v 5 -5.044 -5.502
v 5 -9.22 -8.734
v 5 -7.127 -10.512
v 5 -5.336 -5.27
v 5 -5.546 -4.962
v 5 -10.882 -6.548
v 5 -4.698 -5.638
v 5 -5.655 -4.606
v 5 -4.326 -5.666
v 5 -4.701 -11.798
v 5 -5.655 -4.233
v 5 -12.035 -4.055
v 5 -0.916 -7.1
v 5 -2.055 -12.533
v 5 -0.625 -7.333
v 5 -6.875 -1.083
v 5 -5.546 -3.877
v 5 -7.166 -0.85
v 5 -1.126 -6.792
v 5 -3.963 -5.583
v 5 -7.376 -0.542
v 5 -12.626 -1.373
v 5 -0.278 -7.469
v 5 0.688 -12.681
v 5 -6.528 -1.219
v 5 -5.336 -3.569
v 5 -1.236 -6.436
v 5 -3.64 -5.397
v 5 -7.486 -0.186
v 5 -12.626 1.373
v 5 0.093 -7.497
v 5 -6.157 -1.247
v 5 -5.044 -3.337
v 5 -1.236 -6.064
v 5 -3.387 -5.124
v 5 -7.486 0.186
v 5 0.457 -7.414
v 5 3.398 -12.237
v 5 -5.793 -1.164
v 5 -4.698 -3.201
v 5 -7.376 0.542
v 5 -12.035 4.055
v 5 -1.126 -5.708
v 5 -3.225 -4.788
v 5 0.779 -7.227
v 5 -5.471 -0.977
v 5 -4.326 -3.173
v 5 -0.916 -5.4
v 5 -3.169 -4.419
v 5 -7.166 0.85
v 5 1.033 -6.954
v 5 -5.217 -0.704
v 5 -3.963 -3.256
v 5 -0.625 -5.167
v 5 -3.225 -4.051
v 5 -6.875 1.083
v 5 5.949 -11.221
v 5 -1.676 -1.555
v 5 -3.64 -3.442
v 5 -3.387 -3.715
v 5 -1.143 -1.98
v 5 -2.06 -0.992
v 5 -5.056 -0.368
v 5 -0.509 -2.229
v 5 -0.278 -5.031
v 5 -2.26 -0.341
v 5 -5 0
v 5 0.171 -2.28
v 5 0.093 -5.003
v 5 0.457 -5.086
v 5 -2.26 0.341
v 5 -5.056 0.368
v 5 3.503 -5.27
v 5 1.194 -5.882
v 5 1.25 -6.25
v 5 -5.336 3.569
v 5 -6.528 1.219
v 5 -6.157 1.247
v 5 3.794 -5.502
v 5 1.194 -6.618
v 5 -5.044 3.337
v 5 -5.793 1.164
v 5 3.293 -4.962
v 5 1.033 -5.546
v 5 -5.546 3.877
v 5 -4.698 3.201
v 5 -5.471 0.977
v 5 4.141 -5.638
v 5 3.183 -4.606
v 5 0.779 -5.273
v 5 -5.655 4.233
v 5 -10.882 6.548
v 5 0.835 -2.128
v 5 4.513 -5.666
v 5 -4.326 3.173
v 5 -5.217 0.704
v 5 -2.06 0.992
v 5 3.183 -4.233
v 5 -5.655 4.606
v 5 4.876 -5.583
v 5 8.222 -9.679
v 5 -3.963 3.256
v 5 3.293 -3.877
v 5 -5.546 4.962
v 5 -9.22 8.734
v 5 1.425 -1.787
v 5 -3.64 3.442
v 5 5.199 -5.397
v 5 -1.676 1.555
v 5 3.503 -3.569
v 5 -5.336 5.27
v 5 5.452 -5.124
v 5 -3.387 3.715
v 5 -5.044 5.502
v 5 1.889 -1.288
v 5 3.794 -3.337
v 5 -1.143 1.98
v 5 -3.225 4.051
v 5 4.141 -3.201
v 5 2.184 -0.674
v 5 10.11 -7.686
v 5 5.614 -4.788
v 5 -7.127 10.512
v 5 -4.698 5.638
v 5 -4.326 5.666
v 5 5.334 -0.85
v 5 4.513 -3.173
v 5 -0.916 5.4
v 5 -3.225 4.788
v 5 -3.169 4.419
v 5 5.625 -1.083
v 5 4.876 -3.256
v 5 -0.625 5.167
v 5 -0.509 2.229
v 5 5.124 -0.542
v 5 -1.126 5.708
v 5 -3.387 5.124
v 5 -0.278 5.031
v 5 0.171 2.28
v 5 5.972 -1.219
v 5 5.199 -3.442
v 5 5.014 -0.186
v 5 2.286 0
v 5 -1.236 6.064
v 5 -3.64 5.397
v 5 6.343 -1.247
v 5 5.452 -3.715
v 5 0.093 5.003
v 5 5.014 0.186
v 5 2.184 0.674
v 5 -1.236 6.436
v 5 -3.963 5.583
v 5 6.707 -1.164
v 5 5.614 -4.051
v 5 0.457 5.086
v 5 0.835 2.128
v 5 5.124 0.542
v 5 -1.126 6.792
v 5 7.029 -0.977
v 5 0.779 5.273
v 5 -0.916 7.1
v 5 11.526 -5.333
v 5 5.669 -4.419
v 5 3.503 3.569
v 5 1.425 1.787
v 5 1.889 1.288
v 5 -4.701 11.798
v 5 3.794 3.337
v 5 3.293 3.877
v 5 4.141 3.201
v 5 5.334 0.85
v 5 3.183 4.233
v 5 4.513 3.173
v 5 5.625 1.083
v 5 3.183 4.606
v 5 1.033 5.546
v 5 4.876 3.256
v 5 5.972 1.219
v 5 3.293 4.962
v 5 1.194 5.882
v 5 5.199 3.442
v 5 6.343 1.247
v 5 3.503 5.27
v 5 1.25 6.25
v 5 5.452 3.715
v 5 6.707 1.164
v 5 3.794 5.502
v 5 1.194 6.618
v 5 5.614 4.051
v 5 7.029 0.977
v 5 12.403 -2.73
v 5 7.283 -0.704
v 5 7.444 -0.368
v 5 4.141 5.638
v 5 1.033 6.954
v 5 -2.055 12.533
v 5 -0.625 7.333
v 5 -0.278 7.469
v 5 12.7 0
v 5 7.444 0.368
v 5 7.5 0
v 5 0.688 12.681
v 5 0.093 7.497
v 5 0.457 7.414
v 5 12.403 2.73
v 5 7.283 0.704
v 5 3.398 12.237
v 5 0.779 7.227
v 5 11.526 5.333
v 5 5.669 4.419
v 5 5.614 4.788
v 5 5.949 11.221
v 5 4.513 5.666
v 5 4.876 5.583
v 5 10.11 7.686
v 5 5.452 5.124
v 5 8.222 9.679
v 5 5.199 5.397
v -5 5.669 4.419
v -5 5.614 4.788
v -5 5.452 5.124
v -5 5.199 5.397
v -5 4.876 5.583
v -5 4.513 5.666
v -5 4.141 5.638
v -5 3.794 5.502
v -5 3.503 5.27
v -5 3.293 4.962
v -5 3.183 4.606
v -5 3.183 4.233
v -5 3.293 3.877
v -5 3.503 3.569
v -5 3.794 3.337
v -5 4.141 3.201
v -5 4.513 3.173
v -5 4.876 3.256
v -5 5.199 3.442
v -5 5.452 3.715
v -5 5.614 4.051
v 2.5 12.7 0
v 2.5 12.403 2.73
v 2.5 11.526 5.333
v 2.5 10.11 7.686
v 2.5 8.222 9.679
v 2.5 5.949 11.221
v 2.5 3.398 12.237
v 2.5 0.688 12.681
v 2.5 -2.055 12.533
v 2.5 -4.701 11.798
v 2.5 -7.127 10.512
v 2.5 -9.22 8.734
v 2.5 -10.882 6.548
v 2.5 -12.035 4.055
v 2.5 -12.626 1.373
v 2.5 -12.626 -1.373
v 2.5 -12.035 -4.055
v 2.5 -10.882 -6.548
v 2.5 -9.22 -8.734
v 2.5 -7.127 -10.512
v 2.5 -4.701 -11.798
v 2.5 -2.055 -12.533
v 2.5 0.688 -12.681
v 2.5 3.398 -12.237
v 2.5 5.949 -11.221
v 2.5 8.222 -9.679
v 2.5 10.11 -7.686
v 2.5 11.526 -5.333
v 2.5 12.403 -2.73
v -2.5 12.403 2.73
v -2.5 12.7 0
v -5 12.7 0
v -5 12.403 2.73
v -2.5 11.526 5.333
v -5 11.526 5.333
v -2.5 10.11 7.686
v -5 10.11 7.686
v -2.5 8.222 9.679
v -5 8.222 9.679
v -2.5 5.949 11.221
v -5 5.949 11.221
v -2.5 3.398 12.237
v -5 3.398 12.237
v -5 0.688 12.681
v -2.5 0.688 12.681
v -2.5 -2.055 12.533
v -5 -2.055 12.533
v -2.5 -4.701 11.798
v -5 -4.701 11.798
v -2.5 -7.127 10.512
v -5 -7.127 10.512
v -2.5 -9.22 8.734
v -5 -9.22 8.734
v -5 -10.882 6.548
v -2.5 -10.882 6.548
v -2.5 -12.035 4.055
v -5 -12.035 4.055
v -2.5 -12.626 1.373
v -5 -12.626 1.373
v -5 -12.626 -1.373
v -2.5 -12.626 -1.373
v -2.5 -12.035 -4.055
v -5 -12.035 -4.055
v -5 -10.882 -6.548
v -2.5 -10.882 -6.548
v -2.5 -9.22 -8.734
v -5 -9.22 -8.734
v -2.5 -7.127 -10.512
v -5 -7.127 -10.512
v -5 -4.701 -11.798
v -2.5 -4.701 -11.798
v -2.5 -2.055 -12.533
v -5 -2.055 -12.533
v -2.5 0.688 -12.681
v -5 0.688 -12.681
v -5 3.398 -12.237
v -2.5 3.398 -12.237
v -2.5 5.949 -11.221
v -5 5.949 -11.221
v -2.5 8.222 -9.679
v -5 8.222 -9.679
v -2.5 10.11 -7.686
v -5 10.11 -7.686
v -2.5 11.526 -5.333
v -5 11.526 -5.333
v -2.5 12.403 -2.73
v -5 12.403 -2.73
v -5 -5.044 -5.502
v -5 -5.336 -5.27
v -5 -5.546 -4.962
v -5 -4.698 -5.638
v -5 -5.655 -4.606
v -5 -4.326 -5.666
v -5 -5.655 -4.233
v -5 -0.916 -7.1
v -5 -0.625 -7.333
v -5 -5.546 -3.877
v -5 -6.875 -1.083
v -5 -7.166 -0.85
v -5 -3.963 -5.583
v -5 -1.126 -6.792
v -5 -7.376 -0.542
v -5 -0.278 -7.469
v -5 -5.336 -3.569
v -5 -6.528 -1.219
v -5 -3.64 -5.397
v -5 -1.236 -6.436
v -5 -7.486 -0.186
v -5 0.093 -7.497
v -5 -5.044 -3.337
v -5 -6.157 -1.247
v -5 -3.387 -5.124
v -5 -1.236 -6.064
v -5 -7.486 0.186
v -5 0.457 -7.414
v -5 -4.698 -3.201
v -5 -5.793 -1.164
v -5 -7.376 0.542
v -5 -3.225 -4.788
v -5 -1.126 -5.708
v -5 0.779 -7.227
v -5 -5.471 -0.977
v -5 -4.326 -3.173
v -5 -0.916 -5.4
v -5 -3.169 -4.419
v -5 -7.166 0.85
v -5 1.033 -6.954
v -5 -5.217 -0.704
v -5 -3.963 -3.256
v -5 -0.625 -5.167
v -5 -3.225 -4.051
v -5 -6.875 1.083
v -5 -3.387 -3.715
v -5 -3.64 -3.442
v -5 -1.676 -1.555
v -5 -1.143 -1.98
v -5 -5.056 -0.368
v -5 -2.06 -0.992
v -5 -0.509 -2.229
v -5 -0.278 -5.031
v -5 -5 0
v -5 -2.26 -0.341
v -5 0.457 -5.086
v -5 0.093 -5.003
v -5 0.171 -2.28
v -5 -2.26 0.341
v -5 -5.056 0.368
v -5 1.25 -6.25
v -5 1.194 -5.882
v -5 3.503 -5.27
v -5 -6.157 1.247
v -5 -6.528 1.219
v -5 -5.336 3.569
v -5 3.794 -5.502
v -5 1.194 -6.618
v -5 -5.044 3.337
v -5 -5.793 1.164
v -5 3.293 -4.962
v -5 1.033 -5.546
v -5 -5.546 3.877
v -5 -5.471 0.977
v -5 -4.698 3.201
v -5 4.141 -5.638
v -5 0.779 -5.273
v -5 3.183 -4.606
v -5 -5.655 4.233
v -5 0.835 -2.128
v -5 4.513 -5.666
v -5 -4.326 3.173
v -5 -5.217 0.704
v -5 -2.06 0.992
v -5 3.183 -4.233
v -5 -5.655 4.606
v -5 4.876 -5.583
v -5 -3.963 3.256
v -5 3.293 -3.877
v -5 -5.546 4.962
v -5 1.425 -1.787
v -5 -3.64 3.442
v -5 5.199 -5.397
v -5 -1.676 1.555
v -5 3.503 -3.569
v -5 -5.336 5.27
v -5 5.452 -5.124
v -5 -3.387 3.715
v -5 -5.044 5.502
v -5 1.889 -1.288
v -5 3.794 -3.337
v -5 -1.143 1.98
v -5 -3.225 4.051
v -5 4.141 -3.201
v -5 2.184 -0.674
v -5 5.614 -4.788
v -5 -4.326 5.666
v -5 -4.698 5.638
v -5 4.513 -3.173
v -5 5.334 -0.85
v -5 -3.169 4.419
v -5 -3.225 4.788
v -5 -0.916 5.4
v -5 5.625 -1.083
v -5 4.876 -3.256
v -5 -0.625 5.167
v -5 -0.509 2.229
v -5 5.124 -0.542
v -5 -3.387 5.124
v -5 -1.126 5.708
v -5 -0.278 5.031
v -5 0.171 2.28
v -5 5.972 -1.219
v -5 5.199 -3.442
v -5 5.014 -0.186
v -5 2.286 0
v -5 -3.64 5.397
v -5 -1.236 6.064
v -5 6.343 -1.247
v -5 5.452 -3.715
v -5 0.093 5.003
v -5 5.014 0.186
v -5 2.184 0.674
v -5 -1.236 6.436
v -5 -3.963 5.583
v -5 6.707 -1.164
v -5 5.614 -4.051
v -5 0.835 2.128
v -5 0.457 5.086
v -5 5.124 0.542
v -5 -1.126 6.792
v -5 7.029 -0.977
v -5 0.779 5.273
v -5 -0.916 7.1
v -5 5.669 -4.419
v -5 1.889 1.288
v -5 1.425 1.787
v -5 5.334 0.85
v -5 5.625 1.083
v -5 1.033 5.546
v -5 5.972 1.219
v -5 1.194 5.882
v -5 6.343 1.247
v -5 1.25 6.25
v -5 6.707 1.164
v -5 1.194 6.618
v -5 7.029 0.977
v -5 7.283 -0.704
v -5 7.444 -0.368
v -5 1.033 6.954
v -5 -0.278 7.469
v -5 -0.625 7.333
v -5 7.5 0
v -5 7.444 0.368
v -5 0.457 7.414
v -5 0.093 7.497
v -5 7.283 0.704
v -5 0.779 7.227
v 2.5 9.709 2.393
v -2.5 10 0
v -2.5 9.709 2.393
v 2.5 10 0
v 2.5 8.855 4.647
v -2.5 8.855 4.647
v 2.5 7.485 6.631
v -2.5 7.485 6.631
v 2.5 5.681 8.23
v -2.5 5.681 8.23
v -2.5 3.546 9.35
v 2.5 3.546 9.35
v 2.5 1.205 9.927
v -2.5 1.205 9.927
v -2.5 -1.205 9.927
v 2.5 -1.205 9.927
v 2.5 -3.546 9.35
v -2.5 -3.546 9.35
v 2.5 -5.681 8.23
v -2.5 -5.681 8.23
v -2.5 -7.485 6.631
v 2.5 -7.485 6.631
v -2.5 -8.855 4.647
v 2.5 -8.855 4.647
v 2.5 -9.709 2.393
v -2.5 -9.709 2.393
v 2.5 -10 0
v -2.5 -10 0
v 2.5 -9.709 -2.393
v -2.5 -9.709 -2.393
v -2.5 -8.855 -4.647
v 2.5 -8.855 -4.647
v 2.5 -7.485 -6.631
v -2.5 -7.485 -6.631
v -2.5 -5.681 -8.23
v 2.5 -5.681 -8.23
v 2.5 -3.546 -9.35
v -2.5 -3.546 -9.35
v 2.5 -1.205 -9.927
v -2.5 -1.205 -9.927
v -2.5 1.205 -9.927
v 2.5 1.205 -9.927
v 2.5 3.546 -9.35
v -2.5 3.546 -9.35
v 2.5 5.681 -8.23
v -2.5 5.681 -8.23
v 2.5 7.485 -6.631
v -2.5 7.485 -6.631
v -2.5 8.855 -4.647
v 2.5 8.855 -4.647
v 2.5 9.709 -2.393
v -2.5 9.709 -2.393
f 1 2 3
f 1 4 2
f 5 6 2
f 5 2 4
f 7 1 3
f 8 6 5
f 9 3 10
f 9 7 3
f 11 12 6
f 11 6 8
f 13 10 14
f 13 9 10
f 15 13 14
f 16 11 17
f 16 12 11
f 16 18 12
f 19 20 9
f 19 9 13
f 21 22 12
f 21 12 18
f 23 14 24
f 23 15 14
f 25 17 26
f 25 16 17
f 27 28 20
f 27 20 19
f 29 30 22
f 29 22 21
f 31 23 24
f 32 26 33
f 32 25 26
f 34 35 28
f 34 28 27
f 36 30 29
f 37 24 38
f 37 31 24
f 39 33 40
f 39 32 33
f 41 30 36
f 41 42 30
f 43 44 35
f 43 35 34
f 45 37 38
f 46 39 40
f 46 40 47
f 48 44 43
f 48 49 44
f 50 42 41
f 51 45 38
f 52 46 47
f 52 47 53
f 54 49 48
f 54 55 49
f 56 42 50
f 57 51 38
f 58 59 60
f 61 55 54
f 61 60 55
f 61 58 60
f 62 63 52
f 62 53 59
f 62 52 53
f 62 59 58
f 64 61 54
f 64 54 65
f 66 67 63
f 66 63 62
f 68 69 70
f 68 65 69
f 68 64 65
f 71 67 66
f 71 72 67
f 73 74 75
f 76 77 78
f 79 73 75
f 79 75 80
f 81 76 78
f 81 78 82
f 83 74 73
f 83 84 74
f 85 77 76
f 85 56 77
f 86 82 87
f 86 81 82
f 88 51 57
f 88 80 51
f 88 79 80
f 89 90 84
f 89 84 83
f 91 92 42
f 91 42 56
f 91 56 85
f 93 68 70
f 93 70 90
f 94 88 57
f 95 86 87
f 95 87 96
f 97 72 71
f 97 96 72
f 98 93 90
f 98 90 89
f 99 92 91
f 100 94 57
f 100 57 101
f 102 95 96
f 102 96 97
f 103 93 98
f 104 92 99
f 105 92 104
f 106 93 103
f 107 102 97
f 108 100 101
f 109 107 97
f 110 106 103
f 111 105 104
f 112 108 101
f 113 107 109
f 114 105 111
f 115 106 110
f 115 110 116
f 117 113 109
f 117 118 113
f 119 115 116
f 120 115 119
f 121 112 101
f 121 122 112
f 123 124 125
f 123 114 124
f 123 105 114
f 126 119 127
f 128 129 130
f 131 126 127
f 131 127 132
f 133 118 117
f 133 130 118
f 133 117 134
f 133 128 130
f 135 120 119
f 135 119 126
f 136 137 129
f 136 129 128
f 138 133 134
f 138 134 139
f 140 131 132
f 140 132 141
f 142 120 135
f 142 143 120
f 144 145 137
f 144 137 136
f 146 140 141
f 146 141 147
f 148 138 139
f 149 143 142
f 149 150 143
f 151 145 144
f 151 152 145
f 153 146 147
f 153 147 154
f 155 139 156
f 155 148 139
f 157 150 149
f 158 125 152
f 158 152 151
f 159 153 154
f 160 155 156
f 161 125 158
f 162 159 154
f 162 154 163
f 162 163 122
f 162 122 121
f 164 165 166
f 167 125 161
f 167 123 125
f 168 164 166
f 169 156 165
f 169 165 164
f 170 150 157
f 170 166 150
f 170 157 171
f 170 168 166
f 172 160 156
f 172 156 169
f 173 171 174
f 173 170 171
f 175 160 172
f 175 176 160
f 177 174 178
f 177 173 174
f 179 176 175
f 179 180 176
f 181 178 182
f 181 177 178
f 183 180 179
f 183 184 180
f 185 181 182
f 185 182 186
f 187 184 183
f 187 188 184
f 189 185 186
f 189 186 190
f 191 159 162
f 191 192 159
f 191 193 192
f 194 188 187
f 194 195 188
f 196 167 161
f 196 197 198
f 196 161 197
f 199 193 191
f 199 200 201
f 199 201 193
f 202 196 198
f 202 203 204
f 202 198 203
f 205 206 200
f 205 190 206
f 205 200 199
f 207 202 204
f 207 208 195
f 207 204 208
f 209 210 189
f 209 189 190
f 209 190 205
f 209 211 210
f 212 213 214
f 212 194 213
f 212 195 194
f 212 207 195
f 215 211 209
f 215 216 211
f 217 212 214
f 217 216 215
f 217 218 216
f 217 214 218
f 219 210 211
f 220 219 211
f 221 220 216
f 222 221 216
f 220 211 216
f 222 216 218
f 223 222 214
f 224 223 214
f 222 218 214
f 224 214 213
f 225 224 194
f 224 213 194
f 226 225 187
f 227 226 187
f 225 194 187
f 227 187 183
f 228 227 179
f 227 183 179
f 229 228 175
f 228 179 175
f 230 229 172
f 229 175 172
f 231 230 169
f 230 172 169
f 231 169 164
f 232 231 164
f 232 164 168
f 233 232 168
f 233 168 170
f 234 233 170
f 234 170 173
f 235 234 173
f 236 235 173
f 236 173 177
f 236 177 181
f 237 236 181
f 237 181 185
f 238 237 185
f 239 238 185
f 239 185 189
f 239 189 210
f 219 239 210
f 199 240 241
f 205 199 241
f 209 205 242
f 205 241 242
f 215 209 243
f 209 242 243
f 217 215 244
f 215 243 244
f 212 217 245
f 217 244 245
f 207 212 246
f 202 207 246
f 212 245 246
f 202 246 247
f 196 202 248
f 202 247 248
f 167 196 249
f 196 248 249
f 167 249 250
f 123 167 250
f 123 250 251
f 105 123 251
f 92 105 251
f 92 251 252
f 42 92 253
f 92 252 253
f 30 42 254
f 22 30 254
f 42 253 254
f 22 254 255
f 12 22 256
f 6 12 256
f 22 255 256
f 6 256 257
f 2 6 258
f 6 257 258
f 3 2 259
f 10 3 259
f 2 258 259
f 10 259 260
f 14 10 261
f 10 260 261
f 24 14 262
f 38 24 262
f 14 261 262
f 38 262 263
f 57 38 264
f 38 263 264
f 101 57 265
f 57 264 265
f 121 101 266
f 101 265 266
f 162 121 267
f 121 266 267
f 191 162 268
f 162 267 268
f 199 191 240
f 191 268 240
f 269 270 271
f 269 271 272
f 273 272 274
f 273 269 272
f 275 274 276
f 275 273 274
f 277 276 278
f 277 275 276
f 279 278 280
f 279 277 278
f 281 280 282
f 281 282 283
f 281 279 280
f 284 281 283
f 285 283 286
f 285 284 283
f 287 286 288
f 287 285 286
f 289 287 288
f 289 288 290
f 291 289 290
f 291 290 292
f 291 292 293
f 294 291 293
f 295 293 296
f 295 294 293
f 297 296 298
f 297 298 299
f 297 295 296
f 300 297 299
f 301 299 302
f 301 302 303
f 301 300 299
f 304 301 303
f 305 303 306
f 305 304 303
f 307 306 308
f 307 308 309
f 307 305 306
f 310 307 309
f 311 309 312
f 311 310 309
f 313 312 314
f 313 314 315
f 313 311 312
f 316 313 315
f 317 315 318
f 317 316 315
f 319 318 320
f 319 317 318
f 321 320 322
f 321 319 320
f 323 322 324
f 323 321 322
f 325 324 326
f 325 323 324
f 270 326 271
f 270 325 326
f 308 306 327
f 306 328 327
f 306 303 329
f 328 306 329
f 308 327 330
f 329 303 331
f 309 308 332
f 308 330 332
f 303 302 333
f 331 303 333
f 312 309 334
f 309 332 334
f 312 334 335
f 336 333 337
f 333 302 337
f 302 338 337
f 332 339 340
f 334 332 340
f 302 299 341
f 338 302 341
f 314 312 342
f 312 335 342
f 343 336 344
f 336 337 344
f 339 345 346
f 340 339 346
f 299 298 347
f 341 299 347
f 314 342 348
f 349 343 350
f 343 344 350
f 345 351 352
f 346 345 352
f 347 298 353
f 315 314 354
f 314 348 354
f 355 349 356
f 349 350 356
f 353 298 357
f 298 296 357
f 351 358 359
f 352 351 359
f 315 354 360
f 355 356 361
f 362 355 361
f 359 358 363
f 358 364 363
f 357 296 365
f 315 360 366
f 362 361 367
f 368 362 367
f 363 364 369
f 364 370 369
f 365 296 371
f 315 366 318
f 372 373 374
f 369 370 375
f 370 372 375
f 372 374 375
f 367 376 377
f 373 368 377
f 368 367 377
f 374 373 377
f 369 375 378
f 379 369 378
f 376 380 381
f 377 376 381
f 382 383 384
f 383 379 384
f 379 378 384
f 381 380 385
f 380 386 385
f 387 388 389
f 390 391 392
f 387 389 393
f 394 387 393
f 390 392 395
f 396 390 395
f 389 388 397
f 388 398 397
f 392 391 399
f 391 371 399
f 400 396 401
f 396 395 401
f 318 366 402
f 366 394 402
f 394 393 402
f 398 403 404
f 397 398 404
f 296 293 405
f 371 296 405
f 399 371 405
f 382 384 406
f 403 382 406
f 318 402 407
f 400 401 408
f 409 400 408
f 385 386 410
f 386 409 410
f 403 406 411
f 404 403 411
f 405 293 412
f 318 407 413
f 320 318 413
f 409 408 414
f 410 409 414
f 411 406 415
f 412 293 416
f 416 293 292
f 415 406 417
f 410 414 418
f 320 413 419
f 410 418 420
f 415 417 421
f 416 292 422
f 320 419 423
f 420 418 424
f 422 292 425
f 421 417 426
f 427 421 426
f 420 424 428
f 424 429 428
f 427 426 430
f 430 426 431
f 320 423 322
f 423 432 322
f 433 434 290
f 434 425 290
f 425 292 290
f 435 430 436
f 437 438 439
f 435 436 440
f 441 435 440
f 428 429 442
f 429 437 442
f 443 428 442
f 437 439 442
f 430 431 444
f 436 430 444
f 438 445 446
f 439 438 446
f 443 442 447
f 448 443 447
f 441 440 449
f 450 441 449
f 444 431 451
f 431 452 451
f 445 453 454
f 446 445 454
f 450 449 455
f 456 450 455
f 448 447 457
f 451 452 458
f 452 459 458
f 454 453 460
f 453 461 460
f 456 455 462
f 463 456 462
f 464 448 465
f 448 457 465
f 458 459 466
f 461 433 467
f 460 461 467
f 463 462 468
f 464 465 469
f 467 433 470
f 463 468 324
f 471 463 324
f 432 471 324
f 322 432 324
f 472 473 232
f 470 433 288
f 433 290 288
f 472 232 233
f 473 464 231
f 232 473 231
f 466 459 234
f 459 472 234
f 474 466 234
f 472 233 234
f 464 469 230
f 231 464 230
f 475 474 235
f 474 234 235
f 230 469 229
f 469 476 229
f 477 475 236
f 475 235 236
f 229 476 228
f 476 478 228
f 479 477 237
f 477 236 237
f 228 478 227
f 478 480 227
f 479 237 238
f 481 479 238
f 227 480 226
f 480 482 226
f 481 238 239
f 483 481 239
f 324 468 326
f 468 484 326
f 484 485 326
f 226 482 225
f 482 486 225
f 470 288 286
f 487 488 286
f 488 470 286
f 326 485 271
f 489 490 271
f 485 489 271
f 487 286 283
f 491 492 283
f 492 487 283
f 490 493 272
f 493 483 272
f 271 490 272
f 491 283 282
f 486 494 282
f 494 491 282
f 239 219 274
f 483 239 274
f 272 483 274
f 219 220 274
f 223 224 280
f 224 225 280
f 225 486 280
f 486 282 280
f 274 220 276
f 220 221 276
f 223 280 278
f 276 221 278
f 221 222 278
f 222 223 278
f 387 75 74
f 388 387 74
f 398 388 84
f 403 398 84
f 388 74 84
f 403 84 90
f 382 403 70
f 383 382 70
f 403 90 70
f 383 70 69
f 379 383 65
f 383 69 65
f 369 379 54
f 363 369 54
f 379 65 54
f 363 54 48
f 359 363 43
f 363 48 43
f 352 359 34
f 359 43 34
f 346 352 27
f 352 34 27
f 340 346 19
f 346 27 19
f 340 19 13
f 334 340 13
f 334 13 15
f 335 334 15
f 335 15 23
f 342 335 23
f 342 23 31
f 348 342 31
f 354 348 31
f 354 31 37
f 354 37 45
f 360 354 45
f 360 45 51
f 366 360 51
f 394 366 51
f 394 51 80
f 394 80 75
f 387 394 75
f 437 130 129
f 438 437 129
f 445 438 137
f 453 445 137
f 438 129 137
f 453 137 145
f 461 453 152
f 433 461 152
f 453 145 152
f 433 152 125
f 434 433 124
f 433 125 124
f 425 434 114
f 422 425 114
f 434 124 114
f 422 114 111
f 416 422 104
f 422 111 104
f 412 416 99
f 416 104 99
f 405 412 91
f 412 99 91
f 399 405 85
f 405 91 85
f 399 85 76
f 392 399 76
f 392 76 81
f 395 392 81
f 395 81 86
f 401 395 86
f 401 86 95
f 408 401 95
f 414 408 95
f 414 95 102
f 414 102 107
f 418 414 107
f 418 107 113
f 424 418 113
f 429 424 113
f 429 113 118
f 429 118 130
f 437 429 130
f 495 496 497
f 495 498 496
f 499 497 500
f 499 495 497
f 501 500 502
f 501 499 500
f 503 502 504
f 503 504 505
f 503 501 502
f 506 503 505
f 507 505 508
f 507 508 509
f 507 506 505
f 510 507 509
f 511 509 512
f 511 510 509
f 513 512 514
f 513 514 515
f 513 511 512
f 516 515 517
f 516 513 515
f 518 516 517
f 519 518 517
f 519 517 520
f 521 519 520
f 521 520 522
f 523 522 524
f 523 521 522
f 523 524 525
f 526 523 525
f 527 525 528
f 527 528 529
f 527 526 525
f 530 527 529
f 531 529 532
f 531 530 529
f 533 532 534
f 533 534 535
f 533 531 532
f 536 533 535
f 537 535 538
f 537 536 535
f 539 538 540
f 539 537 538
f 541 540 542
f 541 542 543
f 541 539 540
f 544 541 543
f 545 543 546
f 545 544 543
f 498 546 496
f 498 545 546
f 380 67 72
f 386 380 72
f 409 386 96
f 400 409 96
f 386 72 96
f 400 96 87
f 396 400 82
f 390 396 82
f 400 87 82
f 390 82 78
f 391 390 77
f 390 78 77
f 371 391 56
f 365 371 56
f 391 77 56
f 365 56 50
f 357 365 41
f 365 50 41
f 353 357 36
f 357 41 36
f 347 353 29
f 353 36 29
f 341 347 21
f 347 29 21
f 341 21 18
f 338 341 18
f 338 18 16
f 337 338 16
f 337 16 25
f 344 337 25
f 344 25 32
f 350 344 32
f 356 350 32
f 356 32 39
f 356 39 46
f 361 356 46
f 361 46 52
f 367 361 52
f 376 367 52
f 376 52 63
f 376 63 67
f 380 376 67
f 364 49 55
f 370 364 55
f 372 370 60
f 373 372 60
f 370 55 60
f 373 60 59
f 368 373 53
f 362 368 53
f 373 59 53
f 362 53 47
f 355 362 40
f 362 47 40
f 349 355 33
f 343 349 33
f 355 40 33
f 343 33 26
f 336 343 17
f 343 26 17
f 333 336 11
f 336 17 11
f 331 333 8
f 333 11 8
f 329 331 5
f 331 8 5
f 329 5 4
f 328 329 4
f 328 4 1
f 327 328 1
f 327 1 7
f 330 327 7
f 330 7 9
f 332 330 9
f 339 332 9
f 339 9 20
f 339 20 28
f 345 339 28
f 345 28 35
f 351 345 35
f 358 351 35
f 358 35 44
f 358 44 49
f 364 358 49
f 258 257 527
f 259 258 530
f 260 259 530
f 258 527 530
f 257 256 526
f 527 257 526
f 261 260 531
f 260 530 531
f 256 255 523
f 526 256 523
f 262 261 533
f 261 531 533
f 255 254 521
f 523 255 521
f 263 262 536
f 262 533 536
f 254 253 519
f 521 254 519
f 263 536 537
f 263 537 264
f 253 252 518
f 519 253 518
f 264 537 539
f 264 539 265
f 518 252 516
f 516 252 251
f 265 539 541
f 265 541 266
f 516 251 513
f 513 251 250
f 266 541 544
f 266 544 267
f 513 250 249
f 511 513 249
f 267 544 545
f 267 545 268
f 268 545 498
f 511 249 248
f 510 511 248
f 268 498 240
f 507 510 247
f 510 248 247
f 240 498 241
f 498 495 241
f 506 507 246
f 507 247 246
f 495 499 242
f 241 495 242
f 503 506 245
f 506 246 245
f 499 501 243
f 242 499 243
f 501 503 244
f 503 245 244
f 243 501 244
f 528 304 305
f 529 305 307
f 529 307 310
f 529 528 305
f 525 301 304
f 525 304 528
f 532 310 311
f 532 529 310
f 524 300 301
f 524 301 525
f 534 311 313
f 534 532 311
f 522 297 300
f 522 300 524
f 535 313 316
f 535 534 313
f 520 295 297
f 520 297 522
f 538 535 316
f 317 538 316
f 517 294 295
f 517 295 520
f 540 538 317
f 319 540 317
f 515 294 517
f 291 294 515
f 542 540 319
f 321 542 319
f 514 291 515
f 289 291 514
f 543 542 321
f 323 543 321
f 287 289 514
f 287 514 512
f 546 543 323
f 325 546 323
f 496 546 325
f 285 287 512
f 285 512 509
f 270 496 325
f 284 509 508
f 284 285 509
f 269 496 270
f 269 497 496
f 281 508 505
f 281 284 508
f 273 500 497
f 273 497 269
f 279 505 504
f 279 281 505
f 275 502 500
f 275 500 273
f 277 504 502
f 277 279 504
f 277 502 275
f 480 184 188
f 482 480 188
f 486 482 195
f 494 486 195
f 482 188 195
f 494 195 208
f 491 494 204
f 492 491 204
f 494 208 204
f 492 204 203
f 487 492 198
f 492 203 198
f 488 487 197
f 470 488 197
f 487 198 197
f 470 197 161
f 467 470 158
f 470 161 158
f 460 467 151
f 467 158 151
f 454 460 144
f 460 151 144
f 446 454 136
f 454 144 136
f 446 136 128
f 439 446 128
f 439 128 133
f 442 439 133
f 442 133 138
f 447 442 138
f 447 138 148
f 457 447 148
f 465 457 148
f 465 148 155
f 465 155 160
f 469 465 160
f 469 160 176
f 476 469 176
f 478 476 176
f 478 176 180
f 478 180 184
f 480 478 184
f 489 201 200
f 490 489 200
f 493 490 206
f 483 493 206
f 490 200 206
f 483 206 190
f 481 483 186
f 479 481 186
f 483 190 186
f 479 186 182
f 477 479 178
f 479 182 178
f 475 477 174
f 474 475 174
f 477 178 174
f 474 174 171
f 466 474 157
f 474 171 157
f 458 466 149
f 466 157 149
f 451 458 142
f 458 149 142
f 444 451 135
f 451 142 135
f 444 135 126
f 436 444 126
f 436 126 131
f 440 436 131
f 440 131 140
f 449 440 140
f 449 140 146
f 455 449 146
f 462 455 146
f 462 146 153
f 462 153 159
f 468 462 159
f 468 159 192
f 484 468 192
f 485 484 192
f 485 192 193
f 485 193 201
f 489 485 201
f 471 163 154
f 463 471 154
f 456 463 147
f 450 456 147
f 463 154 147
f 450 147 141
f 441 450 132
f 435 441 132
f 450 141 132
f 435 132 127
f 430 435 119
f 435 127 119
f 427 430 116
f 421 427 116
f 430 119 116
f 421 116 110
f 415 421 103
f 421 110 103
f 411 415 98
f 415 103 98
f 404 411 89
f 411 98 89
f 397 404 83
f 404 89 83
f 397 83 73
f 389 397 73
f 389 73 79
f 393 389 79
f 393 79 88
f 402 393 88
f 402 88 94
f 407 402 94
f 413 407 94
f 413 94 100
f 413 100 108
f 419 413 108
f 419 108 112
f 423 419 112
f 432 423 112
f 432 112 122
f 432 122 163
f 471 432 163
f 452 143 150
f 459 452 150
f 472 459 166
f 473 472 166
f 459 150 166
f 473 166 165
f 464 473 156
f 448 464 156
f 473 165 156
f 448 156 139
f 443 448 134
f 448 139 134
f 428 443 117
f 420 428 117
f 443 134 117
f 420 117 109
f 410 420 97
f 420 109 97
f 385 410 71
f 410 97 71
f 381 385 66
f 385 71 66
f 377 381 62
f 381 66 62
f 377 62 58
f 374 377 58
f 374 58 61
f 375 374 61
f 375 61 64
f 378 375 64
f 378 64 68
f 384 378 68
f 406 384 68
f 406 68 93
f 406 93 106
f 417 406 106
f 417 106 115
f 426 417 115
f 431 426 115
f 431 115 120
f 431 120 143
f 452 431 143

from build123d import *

# Parameters (mm, degrees)
F0_R     = 10
F1_DEPTH = 2.5
F2_R     = 12.7
F3_DEPTH = 2.5
F5_R     = 2.286
F6_DEPTH = 10.001
F7_R     = 1.25
F8_DEPTH = 10.001


with BuildPart() as f1:
    # F0 (on Right) → F1 (new body)
    with BuildSketch(Plane.YZ):
        Circle(F0_R)
    extrude(amount=F1_DEPTH)

    # F2 (on face) → F3 (join)
    with BuildSketch(Plane.YZ.offset(2.5)):
        Circle(F2_R)
    extrude(amount=F3_DEPTH)

    # F4: F1 across face


with BuildPart() as f1_1:
    add(f1.part)
    add(f1.part.mirror(Plane(origin=(0, 0, 0), x_dir=(0, 1, 0), z_dir=(-1, 0, 0))))

    # F5 (on face) → F6 (cut, through all)
    with BuildSketch(Plane.YZ.offset(5)):
        Circle(F5_R)
    extrude(amount=-F6_DEPTH, mode=Mode.SUBTRACT)

    # F7 (on face) → F8 (cut, through all)
    with BuildSketch(Plane.YZ.offset(5)):
        with Locations((0, 6.25)):
            Circle(F7_R)
        with Locations((6.25, 0)):
            Circle(F7_R)
        with Locations((0, -6.25)):
            Circle(F7_R)
        with Locations((-6.25, 0)):
            Circle(F7_R)
        with Locations((-4.419417, -4.419417)):
            Circle(F7_R)
        with Locations((4.419417, -4.419417)):
            Circle(F7_R)
        with Locations((-4.419417, 4.419417)):
            Circle(F7_R)
        with Locations((4.419417, 4.419417)):
            Circle(F7_R)
    extrude(amount=-F8_DEPTH, mode=Mode.SUBTRACT)


solid = f1_1.part
